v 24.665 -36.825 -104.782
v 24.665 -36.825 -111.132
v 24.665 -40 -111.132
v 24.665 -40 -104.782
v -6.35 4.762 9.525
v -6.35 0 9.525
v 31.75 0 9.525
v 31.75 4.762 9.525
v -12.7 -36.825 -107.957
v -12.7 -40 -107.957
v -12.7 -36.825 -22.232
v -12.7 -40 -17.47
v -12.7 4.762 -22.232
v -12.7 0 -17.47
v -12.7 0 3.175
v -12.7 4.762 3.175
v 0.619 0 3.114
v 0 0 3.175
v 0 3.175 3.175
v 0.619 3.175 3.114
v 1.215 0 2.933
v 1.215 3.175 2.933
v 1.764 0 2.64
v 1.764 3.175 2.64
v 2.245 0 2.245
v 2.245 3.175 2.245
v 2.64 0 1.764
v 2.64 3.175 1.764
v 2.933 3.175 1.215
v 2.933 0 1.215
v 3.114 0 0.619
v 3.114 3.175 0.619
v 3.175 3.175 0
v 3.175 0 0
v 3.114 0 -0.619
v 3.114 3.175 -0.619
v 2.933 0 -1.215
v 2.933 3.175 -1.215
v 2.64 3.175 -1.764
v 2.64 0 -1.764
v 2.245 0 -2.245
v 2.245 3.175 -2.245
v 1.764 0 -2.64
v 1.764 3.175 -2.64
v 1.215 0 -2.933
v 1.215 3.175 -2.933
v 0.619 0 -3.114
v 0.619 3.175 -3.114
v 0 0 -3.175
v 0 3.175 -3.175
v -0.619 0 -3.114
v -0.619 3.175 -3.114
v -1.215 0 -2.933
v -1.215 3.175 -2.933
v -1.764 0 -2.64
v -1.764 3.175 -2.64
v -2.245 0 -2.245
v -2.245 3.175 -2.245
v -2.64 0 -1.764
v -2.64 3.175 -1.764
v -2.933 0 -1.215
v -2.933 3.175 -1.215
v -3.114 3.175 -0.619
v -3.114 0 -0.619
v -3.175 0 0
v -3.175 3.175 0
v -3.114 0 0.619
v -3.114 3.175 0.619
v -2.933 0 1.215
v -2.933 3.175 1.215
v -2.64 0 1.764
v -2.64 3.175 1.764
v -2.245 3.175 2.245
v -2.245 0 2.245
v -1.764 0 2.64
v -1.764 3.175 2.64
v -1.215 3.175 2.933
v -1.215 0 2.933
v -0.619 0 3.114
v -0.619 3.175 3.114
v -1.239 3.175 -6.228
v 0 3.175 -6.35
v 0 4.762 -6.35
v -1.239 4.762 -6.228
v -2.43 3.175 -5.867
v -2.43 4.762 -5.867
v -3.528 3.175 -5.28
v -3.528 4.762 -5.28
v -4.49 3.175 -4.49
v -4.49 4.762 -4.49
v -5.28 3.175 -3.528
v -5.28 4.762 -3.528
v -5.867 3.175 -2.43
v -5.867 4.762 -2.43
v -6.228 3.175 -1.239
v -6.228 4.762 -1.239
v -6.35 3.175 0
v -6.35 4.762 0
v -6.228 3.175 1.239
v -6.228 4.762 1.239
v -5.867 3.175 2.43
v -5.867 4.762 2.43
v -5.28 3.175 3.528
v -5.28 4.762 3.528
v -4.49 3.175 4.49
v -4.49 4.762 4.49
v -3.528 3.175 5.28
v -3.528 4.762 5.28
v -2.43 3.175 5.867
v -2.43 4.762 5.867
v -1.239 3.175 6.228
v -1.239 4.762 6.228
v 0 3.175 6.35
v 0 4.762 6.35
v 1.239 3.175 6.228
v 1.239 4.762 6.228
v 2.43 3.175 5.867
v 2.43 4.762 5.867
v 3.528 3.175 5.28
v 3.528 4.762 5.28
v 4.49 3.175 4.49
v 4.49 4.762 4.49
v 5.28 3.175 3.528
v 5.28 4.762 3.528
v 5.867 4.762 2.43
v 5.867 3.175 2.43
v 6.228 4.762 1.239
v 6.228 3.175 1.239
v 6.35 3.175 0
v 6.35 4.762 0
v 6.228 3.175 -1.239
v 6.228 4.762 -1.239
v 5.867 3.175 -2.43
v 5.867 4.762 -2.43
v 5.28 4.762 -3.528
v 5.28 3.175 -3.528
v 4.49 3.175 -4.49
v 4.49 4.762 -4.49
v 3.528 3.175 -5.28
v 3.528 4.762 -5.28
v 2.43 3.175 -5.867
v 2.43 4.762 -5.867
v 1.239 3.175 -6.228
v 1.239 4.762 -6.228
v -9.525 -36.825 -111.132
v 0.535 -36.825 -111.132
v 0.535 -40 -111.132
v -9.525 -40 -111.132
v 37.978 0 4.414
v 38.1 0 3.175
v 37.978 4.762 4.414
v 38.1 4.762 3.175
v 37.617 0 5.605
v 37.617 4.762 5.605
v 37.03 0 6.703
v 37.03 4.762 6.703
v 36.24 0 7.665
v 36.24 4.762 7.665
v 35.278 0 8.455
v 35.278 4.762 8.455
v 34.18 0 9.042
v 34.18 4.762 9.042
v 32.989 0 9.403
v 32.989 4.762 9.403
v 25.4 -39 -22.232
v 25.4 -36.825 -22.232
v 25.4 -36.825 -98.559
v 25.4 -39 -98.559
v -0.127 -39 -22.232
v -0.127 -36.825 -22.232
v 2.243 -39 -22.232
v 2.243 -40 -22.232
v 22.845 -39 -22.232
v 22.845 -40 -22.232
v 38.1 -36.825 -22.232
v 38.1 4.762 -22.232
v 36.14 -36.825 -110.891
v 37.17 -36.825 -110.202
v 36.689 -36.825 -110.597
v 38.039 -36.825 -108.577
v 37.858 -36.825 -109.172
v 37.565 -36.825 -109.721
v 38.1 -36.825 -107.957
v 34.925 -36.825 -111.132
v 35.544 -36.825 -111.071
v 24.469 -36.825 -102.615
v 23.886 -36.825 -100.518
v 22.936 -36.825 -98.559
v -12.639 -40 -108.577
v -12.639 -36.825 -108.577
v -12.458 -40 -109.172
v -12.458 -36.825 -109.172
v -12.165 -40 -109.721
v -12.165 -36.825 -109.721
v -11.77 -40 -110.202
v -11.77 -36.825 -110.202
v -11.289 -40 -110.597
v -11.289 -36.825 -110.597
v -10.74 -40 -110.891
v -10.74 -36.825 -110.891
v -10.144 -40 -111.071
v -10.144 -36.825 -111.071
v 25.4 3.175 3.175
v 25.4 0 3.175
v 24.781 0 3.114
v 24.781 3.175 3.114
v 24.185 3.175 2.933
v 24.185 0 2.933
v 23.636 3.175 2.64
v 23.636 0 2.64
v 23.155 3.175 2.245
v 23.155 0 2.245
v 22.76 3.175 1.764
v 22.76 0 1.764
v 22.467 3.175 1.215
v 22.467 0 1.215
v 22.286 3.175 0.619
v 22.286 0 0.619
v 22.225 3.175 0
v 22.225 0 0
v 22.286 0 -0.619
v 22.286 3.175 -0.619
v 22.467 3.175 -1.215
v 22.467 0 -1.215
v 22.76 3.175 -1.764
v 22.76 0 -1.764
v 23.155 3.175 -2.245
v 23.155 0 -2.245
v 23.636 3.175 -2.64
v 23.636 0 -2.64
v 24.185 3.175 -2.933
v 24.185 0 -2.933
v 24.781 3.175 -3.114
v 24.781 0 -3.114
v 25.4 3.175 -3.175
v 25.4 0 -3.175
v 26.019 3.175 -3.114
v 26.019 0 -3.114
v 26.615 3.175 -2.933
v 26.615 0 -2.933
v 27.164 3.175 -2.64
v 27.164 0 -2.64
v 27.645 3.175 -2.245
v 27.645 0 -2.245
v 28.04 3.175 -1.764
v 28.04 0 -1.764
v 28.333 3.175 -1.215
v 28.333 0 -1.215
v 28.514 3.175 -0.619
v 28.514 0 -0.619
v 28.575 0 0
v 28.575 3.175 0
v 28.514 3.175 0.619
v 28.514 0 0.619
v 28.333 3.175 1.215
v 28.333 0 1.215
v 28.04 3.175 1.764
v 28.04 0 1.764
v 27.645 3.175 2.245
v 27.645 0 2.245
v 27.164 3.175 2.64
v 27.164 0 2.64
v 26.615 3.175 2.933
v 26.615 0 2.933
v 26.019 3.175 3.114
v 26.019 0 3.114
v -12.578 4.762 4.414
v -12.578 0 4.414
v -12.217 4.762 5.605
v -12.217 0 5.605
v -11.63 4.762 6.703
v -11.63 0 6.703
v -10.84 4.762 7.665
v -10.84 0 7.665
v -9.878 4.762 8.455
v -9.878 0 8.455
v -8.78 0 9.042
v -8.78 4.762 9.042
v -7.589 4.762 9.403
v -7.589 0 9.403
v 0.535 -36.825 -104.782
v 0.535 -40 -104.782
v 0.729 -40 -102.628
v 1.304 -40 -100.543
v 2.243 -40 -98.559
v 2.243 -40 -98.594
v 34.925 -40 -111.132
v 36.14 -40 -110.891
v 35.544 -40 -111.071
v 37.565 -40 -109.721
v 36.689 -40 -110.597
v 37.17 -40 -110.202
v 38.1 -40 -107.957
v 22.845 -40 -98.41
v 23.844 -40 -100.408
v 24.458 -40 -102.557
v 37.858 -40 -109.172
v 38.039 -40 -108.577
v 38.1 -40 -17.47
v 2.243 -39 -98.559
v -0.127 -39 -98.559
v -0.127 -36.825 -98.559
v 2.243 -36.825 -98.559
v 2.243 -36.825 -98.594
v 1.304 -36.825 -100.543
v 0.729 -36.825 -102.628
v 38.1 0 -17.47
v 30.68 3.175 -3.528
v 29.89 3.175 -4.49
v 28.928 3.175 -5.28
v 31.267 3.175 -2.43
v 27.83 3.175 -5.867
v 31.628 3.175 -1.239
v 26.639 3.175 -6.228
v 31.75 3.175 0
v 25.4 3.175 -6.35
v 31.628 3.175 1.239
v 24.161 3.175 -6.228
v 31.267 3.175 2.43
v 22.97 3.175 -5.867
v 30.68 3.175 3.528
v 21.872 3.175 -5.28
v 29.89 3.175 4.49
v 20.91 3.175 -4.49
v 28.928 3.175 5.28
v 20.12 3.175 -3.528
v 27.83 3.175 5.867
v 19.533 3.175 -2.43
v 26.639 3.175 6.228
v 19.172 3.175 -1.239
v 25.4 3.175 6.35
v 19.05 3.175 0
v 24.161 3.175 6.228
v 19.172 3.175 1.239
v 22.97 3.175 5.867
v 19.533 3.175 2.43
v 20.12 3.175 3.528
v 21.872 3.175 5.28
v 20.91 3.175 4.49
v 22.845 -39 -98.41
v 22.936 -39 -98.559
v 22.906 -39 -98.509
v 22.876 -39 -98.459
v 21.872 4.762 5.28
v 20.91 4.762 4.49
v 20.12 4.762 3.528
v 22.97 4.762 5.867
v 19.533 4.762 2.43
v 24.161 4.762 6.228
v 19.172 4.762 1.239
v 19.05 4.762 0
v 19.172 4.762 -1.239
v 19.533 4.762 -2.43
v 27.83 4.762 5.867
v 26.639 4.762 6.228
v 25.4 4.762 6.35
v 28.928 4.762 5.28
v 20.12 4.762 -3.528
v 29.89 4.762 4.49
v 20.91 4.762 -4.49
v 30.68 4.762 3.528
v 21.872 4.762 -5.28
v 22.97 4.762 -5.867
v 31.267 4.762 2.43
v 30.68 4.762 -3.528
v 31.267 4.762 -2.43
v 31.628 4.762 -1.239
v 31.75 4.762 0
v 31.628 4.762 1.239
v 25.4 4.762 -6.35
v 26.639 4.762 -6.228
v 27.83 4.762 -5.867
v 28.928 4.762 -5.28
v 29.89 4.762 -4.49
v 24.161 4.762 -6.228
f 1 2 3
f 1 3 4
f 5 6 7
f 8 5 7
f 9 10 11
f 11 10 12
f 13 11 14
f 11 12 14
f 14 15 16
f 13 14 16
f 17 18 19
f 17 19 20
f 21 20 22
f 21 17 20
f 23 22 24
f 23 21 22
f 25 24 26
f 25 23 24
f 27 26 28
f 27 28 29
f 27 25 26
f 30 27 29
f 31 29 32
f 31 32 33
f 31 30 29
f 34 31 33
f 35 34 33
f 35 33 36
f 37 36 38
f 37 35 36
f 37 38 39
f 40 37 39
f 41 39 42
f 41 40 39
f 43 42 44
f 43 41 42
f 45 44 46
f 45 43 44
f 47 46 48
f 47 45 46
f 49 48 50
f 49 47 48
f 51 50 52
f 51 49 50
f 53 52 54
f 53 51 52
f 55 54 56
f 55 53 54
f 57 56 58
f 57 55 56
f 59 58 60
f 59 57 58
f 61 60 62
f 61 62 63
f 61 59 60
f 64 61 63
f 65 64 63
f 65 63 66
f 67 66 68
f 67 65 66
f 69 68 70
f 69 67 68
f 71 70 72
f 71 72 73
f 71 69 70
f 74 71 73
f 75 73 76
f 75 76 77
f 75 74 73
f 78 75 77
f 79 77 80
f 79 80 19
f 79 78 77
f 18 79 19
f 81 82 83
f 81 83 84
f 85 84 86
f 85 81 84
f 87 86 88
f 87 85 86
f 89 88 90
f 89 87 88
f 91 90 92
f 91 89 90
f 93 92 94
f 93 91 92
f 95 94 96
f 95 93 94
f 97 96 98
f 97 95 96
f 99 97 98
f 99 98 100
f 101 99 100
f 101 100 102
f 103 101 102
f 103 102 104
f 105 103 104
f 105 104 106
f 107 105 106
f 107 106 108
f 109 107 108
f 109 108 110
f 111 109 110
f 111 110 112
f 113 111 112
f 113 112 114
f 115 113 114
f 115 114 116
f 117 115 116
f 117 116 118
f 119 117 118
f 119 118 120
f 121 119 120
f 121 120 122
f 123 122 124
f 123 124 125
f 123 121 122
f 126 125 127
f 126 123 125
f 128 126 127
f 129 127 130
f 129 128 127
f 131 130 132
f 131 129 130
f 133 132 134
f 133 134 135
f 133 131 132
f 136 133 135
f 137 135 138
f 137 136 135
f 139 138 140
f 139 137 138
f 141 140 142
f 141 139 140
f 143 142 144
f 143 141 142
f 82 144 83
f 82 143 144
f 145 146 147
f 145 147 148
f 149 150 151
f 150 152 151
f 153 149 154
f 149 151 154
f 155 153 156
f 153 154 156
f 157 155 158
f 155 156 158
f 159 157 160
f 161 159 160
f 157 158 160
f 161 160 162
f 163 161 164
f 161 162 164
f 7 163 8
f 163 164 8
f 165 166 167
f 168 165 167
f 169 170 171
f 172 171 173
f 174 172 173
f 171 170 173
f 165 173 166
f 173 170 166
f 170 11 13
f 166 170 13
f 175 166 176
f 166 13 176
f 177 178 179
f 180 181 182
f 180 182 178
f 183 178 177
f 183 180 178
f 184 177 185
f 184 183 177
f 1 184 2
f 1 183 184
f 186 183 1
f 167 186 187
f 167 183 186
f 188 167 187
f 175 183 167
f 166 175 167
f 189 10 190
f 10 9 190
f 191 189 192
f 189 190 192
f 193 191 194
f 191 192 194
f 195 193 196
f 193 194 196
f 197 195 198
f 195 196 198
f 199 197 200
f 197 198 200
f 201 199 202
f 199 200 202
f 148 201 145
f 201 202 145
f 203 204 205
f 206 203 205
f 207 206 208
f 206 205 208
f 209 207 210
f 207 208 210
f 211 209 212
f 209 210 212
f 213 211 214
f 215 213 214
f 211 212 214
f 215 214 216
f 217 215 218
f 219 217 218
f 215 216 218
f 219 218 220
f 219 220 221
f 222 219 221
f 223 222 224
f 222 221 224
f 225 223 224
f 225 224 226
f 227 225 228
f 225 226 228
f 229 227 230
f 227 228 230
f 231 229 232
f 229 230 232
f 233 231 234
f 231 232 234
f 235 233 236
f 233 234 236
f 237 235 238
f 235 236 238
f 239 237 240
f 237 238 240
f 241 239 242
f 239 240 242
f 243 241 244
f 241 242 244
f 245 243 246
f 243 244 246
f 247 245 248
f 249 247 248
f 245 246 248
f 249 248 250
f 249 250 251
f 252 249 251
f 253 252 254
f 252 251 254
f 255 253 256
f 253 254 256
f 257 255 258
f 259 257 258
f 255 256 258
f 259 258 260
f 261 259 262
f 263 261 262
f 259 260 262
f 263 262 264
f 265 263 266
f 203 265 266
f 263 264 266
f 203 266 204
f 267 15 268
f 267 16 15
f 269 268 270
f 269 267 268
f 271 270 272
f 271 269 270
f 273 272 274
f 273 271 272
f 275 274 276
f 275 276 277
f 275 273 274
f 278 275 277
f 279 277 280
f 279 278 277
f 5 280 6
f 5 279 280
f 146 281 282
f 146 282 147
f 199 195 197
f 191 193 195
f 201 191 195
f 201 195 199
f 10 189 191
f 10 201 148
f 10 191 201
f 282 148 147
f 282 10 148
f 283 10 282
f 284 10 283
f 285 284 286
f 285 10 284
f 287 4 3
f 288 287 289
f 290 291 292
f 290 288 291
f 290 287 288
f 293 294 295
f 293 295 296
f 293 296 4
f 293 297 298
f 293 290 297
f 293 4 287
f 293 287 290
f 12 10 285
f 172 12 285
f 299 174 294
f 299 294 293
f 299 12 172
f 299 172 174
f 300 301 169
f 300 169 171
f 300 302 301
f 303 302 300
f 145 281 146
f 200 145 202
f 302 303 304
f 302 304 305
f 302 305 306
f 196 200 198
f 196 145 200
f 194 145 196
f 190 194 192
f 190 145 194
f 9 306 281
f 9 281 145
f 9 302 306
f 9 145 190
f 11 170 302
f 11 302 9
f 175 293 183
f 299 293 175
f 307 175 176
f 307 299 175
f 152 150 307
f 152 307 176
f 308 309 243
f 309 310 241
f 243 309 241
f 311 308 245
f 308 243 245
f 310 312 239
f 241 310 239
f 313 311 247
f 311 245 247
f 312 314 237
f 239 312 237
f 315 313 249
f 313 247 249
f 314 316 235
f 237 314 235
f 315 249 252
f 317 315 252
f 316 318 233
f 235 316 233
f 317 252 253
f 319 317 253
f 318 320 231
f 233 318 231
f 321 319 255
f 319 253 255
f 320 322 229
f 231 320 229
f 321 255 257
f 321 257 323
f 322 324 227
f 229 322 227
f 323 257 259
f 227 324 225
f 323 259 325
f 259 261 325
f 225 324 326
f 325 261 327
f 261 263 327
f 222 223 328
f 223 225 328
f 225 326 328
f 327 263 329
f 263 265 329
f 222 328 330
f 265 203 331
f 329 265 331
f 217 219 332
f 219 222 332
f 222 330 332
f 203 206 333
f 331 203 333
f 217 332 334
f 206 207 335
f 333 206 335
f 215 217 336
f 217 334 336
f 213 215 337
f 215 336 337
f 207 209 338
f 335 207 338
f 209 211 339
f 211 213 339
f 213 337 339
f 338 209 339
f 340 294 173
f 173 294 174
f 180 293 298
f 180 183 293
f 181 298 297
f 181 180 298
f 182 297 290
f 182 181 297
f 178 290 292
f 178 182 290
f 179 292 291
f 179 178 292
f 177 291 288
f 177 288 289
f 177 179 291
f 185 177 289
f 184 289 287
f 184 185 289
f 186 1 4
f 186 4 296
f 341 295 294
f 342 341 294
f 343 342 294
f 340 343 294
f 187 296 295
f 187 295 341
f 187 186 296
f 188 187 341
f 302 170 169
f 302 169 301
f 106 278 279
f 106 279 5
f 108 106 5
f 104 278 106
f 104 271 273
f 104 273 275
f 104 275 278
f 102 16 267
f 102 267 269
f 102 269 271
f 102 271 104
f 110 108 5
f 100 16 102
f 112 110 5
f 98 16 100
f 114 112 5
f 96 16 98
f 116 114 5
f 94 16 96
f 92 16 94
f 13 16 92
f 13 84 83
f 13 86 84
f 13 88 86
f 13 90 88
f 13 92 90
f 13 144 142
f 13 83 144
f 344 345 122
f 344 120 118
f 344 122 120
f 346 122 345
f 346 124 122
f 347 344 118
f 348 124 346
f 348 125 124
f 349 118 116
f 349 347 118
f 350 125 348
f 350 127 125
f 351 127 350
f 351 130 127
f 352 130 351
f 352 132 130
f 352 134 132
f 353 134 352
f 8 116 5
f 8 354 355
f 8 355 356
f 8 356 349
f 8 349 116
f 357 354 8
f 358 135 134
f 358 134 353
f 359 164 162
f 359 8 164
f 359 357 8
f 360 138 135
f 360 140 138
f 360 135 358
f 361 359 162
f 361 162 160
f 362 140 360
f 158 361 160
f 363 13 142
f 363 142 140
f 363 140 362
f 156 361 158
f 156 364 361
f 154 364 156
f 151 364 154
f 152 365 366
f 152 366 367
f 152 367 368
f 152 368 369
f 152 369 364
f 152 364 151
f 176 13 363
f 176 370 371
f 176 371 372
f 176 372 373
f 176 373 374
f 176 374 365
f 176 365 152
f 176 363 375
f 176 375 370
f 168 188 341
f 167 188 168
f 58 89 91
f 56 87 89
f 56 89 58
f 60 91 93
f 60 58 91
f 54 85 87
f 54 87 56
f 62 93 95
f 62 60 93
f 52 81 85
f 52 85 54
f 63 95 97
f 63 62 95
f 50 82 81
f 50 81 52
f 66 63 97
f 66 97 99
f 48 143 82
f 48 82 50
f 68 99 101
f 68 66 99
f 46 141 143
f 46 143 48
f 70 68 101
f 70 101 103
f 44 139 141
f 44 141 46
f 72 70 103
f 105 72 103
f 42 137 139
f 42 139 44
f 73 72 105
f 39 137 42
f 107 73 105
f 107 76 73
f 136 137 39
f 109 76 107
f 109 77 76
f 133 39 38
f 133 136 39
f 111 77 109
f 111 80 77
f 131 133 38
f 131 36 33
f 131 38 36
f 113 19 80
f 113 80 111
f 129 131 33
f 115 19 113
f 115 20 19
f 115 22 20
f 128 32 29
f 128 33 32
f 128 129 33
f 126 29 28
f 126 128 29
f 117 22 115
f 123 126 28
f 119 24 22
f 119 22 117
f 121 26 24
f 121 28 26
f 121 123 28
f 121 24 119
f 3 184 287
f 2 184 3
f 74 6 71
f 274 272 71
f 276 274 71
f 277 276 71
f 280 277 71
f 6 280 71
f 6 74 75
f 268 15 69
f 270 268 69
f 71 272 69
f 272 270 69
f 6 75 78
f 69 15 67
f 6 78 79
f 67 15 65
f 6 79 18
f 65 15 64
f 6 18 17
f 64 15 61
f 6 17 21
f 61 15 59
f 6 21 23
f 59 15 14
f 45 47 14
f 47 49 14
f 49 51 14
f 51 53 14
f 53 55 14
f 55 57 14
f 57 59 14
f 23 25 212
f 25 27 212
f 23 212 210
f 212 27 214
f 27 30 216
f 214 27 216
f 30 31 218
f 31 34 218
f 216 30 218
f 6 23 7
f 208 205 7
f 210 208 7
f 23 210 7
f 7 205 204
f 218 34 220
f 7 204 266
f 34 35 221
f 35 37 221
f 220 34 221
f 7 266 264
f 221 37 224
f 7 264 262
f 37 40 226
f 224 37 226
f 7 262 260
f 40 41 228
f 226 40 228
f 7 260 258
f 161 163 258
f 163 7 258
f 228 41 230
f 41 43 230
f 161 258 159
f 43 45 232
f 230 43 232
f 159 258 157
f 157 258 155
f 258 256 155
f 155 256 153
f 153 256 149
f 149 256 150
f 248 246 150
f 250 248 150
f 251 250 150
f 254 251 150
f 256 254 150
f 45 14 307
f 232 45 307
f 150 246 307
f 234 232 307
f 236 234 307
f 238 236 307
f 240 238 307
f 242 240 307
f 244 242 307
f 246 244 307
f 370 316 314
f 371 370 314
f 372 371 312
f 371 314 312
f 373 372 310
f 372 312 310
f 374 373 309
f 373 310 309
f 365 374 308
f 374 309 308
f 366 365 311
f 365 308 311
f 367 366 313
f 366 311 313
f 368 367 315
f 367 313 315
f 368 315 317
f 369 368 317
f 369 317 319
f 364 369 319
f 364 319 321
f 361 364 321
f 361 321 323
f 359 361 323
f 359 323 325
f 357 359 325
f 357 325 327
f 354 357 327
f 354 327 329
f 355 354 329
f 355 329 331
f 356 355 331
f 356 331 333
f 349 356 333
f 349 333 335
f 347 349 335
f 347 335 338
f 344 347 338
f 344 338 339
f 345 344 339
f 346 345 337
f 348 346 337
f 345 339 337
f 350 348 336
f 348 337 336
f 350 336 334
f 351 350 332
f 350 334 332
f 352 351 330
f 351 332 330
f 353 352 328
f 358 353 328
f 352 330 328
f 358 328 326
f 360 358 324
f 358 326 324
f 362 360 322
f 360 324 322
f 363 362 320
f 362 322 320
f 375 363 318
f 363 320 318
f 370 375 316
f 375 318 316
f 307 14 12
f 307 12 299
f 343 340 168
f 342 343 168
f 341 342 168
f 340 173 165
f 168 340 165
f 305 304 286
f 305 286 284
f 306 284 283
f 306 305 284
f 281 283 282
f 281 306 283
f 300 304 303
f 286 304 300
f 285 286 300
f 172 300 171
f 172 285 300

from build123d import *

# Parameters (mm, degrees)
SKETCH1_R           = 6.35
SKETCH1_R_2         = 3.175
BOSS_EXTRUDE1_DEPTH = 3.175
SKETCH1_3_R         = 6.35
BOSS_EXTRUDE2_DEPTH = 4.7625
FILLET1_R           = 6.35
SKETCH4_W           = 50.8
SKETCH4_H           = 4.7625
BOSS_EXTRUDE3_DEPTH = 40
SKETCH5_W           = 50.8
SKETCH5_H           = 3.175
BOSS_EXTRUDE4_DEPTH = 88.9
FILLET2_R           = 3.175
SKETCH11_W          = 25.527
SKETCH11_H          = 76.327
CUT_EXTRUDE2_DEPTH  = 125.625465933
SKETCH12_W          = 2.369732381
SKETCH12_H          = 76.327
SKETCH12_W_2        = 2.555200435
BOSS_EXTRUDE5_DEPTH = 1
CUT_EXTRUDE3_DEPTH  = 125.625465933


with BuildPart() as part:
    # Sketch1 → Boss-Extrude1 (new body)
    with BuildSketch(Plane(origin=(0, 0, 0), x_dir=(1, 0, 0), z_dir=(0, 1, 0))):
        Circle(SKETCH1_R)
        Circle(SKETCH1_R_2, mode=Mode.SUBTRACT)
    extrude(amount=BOSS_EXTRUDE1_DEPTH)

    # Sketch1<3> → Boss-Extrude2 (add)
    with BuildSketch(Plane(origin=(0, 0, 0), x_dir=(1, 0, 0), z_dir=(0, 1, 0))):
        Polygon((-12.7, 22.232248258), (-12.7, 0), (-12.7, -9.525), (12.7, -9.525), (12.7, 0), (12.7, 22.232248258), align=None)
        Circle(SKETCH1_3_R, mode=Mode.SUBTRACT)
    extrude(amount=BOSS_EXTRUDE2_DEPTH)

    # Mirror1: part across plane


with BuildPart() as part_1:
    add(part.part)
    add(part.part.mirror(Plane(origin=(12.7, 0, 0), x_dir=(0, 0, 1), z_dir=(1, 0, 0))))

    # Fillet1
    fillet1_edges = [part_1.edges().sort_by_distance(p)[0] for p in [
        (38.1, 2.38125, 9.525),
        (-12.7, 2.38125, 9.525),
    ]]
    fillet(fillet1_edges, radius=FILLET1_R)

    # Sketch4 → Boss-Extrude3 (add)
    with BuildSketch(Plane.XZ):
        with Locations((12.7, -19.850998258)):
            Rectangle(SKETCH4_W, SKETCH4_H)
    extrude(amount=BOSS_EXTRUDE3_DEPTH)

    # Sketch5 → Boss-Extrude4 (add)
    with BuildSketch(Plane(origin=(0, 0, -22.232248258), x_dir=(-1, 0, 0), z_dir=(0, 0, -1))):
        with Locations((-12.7, -38.4125)):
            Rectangle(SKETCH5_W, SKETCH5_H)
    extrude(amount=BOSS_EXTRUDE4_DEPTH)

    # Fillet2
    fillet2_edges = [part_1.edges().sort_by_distance(p)[0] for p in [
        (-12.7, -38.4125, -111.132248258),
        (38.1, -38.4125, -111.132248258),
    ]]
    fillet(fillet2_edges, radius=FILLET2_R)

    # Sketch11 → Cut-Extrude2 (cut, through all)
    with BuildSketch(Plane(origin=(0, -36.825, 0), x_dir=(1, 0, 0), z_dir=(0, 1, 0))):
        with Locations((12.6365, 60.395748258)):
            Rectangle(SKETCH11_W, SKETCH11_H)
    extrude(amount=-CUT_EXTRUDE2_DEPTH, mode=Mode.SUBTRACT)

    # Sketch12 → Boss-Extrude5 (add)
    with BuildSketch(Plane.XZ.offset(40)):
        with Locations((1.05786619, -60.395748258)):
            Rectangle(SKETCH12_W, SKETCH12_H)
        with Locations((24.122399783, -60.395748258)):
            Rectangle(SKETCH12_W_2, SKETCH12_H)
    extrude(amount=-BOSS_EXTRUDE5_DEPTH)

    # Sketch14 → Cut-Extrude3 (cut, through all)
    with BuildSketch(Plane(origin=(0, -36.825, 0), x_dir=(1, 0, 0), z_dir=(0, 1, 0))):
        with BuildLine():
            Line((0.534999946, 104.782248258), (0.534999946, 111.132248258))
            Line((0.534999946, 111.132248258), (24.664999946, 111.132248258))
            Line((24.664999946, 111.132248258), (24.664999946, 104.782248258))
            ThreePointArc((24.664999946, 104.782248258), (24.201028616, 101.468585813), (22.844799565, 98.409783604))
            Line((22.844799565, 98.409783604), (22.844799565, 98.559248258))
            Line((22.844799565, 98.559248258), (2.242732381, 98.559248258))
            Line((2.242732381, 98.559248258), (2.242732381, 98.594257179))
            ThreePointArc((2.242732381, 98.594257179), (0.96976654, 101.572591591), (0.534999946, 104.782248258))
        make_face()
    extrude(amount=-CUT_EXTRUDE3_DEPTH, mode=Mode.SUBTRACT)


solid = part_1.part
